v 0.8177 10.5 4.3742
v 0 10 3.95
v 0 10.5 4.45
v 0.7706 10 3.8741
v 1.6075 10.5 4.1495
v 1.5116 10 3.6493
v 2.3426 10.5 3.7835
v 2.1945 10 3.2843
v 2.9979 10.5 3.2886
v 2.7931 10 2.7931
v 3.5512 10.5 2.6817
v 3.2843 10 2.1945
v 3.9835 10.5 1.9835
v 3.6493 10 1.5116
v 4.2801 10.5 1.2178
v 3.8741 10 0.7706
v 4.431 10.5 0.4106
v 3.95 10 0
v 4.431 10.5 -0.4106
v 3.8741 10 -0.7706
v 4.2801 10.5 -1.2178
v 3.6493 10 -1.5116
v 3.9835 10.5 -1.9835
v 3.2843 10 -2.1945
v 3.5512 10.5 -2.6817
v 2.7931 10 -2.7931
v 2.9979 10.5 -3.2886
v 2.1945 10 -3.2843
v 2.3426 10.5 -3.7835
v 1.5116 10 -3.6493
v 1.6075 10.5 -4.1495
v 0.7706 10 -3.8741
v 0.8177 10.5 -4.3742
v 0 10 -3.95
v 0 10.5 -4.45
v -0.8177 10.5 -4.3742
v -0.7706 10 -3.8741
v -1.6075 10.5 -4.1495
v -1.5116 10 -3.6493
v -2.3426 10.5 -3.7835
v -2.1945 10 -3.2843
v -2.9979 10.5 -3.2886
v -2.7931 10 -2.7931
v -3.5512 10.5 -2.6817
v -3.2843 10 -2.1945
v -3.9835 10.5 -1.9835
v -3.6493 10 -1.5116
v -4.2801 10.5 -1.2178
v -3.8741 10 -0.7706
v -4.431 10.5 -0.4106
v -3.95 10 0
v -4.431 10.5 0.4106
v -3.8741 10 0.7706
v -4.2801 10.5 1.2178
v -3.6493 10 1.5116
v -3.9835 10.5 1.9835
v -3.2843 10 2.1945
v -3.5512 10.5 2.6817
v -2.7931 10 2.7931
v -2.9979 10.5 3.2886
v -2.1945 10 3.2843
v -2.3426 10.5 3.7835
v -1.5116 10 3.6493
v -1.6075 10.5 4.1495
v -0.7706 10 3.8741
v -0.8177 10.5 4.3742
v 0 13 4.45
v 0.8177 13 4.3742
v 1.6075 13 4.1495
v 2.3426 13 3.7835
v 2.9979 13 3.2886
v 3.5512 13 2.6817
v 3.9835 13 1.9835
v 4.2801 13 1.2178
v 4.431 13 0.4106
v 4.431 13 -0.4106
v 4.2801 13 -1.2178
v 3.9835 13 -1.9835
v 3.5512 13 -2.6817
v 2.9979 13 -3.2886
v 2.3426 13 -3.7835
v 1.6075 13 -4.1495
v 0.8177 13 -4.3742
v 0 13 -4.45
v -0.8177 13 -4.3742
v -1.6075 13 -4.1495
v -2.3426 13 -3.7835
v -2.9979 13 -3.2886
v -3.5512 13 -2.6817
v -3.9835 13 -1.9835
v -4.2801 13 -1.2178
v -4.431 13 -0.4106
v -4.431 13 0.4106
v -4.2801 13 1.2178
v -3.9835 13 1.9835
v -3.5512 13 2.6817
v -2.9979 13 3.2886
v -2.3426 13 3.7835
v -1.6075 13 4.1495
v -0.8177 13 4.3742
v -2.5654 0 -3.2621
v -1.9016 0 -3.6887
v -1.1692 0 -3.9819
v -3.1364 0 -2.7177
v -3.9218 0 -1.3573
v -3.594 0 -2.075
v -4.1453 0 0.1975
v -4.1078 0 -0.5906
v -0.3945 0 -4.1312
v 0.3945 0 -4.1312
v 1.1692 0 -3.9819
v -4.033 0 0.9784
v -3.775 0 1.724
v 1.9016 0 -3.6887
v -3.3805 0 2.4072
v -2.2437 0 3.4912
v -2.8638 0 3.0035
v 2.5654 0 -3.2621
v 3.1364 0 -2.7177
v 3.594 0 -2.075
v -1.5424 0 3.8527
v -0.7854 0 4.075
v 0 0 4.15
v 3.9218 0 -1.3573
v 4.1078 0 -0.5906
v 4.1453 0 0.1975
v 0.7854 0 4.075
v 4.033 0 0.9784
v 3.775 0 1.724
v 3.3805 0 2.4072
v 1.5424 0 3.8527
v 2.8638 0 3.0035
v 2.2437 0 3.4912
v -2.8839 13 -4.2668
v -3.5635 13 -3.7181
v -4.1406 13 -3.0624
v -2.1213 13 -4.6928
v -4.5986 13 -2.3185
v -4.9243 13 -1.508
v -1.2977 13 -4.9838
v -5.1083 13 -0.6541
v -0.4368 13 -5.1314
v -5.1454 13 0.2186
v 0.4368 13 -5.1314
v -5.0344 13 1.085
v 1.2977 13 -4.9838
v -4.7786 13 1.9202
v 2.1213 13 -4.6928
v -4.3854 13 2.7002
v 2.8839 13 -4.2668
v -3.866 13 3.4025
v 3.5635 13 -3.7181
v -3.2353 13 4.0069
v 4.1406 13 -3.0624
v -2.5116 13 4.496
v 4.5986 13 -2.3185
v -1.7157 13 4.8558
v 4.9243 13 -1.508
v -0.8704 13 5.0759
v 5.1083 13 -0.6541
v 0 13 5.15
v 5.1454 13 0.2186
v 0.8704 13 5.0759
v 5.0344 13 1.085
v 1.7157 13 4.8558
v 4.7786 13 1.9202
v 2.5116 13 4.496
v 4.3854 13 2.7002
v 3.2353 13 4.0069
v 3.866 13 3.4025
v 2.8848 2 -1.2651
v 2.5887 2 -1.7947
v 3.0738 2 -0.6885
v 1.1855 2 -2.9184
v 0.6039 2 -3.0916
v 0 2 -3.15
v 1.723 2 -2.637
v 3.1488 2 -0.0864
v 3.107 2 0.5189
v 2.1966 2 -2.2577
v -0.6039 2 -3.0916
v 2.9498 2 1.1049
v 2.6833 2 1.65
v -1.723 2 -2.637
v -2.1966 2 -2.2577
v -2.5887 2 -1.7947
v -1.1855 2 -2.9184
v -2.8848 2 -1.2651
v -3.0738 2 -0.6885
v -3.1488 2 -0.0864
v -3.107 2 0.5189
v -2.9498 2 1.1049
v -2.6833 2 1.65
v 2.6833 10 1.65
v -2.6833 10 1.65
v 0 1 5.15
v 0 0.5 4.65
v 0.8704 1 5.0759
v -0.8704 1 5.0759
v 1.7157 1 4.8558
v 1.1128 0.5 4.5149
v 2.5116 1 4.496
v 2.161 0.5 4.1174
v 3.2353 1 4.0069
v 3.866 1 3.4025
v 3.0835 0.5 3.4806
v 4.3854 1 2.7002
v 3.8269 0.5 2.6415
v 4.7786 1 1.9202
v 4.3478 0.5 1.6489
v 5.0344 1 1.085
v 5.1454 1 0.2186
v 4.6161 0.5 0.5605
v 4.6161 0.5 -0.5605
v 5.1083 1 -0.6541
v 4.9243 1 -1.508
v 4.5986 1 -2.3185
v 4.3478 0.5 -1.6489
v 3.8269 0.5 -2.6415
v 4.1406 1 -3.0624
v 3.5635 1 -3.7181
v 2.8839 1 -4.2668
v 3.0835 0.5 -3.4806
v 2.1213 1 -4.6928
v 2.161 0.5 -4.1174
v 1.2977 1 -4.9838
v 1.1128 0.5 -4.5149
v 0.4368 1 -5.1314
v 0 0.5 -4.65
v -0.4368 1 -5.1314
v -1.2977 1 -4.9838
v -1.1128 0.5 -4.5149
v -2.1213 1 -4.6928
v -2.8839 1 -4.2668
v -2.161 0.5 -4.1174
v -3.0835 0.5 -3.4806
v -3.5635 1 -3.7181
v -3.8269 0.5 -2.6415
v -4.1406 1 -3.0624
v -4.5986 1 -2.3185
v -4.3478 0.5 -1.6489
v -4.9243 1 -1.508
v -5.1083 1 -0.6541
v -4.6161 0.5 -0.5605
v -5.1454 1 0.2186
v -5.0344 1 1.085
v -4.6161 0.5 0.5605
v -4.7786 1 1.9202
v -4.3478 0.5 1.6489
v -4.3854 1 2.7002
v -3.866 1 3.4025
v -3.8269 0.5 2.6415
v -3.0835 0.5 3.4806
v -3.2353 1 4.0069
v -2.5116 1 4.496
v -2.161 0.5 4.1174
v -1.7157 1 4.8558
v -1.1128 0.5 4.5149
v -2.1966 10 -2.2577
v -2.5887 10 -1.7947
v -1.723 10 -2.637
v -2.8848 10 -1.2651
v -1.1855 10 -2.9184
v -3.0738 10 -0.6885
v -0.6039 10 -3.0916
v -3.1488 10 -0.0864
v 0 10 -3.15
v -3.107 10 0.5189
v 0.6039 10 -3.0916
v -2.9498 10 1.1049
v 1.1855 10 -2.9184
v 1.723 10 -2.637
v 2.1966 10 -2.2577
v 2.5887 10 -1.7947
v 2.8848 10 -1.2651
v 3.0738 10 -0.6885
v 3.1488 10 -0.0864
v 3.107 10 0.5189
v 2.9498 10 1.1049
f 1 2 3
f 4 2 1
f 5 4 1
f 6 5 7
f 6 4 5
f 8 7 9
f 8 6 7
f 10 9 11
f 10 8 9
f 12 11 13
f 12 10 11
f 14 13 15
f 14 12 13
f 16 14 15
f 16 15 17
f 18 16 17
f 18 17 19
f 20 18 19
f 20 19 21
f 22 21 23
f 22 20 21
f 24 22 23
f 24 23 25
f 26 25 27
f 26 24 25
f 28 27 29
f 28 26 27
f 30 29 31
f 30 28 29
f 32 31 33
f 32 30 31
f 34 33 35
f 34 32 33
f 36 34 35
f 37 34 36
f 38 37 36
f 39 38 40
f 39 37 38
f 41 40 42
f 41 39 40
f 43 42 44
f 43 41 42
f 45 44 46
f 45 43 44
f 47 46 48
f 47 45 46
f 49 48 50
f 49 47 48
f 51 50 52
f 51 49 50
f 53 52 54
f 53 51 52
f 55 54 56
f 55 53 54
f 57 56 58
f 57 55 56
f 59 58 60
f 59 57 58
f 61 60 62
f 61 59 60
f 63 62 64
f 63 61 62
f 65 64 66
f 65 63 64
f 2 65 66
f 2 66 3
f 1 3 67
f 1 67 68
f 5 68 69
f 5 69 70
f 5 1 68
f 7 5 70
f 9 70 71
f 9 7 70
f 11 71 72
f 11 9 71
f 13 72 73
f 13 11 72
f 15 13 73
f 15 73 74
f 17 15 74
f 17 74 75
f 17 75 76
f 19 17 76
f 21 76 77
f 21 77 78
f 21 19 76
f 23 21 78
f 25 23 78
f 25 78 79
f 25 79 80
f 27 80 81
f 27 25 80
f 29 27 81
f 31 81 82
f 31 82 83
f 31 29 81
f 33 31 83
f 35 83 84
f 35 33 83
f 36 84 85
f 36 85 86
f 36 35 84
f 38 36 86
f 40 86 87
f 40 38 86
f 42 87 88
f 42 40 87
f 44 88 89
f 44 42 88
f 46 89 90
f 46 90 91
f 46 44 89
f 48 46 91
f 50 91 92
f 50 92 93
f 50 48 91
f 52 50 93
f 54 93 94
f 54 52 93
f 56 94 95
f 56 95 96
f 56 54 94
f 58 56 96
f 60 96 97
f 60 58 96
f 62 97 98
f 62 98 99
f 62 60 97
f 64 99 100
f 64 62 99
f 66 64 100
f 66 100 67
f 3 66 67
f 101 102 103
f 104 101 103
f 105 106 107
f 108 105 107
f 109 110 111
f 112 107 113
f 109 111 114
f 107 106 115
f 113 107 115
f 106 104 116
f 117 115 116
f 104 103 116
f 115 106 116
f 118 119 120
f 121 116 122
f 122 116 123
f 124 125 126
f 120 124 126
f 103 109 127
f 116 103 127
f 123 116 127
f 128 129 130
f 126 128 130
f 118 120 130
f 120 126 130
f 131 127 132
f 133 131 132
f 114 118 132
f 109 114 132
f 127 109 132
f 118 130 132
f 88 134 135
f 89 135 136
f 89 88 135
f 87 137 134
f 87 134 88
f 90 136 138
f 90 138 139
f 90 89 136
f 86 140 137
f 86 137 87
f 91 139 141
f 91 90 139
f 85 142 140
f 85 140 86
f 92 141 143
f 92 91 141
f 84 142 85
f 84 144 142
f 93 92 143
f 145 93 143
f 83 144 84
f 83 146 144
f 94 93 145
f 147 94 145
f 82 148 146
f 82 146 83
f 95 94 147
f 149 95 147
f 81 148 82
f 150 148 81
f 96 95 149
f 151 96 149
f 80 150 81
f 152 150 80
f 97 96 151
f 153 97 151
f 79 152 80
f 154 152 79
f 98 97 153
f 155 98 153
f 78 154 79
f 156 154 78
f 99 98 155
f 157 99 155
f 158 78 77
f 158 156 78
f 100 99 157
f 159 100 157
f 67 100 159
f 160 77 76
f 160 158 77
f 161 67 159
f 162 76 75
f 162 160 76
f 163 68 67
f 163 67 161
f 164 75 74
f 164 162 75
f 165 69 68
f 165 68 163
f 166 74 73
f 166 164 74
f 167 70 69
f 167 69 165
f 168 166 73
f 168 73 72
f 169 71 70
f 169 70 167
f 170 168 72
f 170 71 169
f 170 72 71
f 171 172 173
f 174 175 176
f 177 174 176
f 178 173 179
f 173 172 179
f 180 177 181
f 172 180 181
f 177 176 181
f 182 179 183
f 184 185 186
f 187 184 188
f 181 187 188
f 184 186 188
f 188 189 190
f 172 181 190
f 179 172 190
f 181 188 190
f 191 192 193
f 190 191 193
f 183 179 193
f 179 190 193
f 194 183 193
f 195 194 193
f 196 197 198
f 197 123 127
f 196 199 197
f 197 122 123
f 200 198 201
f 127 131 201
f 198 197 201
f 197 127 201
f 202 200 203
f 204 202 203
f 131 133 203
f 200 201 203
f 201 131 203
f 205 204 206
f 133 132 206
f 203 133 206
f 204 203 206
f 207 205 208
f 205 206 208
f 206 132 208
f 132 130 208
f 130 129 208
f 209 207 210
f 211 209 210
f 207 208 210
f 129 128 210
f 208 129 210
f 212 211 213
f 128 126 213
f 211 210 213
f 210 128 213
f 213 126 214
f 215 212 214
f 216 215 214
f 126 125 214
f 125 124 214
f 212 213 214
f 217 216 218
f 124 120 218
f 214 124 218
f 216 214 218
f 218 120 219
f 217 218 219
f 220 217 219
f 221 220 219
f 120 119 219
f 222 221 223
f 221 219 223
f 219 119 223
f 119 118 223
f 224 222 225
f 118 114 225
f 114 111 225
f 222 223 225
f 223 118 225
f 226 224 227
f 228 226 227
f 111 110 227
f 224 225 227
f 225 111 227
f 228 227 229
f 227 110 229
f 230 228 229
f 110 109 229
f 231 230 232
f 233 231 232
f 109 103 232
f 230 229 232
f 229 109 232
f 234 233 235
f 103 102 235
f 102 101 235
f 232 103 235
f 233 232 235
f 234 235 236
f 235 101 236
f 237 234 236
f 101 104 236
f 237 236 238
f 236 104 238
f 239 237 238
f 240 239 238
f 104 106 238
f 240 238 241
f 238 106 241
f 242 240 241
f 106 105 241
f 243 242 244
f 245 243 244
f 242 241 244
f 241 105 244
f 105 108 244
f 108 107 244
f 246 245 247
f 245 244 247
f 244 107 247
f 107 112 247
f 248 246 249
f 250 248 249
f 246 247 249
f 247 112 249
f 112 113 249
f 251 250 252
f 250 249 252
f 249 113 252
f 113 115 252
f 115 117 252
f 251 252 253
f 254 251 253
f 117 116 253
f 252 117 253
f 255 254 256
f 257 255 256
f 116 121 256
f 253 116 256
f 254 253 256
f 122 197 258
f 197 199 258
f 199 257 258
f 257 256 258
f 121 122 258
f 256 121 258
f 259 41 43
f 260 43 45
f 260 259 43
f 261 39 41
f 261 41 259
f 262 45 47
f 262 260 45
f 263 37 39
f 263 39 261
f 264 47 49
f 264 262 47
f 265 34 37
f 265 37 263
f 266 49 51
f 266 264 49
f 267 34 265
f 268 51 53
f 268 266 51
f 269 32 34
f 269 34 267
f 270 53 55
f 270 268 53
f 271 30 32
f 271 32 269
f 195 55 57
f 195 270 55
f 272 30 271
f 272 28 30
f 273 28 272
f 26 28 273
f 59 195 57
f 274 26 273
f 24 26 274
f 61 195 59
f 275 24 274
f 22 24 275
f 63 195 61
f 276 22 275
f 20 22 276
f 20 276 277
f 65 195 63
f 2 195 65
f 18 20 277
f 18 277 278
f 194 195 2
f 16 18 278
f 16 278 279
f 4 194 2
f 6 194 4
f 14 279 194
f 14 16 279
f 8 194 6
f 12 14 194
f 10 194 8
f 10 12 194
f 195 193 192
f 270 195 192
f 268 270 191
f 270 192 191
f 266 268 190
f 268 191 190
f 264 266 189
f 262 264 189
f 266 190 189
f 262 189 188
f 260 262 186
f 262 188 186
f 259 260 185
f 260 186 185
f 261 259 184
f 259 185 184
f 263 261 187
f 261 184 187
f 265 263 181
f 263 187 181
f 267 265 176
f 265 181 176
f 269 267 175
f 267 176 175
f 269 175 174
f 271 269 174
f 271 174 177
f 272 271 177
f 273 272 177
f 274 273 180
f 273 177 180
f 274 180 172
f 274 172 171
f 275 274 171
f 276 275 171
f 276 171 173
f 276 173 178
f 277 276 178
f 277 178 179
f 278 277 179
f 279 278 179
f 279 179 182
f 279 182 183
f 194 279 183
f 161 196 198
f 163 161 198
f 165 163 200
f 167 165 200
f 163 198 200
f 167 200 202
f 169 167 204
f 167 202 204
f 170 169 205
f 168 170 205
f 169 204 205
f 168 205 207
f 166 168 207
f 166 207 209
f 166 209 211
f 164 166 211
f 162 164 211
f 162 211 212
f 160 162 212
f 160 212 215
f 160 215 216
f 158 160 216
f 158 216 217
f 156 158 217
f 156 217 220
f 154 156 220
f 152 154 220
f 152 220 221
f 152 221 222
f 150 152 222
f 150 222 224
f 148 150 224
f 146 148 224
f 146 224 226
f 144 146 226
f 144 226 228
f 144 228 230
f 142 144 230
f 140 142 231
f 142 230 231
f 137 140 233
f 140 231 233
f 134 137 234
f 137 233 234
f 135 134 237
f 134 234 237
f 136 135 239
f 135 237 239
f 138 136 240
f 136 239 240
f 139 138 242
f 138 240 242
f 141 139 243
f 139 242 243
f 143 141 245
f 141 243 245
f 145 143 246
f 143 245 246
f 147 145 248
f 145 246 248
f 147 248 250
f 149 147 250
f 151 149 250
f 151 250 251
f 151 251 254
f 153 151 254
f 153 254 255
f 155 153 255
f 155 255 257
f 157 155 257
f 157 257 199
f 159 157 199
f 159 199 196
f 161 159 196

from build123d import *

# Parameters (mm, degrees)
SKETCH1_R           = 5.15
BOSS_EXTRUDE1_DEPTH = 10
SKETCH2_R           = 5.15
BOSS_EXTRUDE2_DEPTH = 2
SKETCH4_R           = 5.15
SKETCH4_R_2         = 4.45
BOSS_EXTRUDE3_DEPTH = 3
CHAMFER1_SIZE       = 1
CHAMFER2_SIZE       = 0.5


with BuildPart() as part:
    # Sketch1 → Boss-Extrude1 (new body)
    with BuildSketch(Plane(origin=(0, 0, 0), x_dir=(1, 0, 0), z_dir=(0, 1, 0))):
        with Locations(Location((0, 0, 0), (0, 0, 270))):
            Circle(SKETCH1_R)
        with BuildLine():
            Line((2.683281573, -1.65), (-2.683281573, -1.65))
            ThreePointArc((-2.683281573, -1.65), (0, 3.15), (2.683281573, -1.65))
        make_face(mode=Mode.SUBTRACT)
    extrude(amount=BOSS_EXTRUDE1_DEPTH)

    # Sketch2 → Boss-Extrude2 (add)
    with BuildSketch(Plane.XZ):
        with Locations(Location((0, 0, 0), (0, 0, 90))):
            Circle(SKETCH2_R)
    extrude(amount=-BOSS_EXTRUDE2_DEPTH)

    # Sketch4 → Boss-Extrude3 (add)
    with BuildSketch(Plane(origin=(0, 10, 0), x_dir=(1, 0, 0), z_dir=(0, 1, 0))):
        with Locations(Location((0, 0, 0), (0, 0, 270))):
            Circle(SKETCH4_R)
        with Locations(Location((0, 0, 0), (0, 0, 270))):
            Circle(SKETCH4_R_2, mode=Mode.SUBTRACT)
    extrude(amount=BOSS_EXTRUDE3_DEPTH)

    # Chamfer1
    chamfer1_edges = [part.edges().sort_by_distance(p)[0] for p in [
        (0, 0, -5.15),
    ]]
    chamfer(chamfer1_edges, length=CHAMFER1_SIZE)

    # Chamfer2
    chamfer2_edges = [part.edges().sort_by_distance(p)[0] for p in [
        (0, 10, -4.45),
    ]]
    chamfer(chamfer2_edges, length=CHAMFER2_SIZE)


solid = part.part
